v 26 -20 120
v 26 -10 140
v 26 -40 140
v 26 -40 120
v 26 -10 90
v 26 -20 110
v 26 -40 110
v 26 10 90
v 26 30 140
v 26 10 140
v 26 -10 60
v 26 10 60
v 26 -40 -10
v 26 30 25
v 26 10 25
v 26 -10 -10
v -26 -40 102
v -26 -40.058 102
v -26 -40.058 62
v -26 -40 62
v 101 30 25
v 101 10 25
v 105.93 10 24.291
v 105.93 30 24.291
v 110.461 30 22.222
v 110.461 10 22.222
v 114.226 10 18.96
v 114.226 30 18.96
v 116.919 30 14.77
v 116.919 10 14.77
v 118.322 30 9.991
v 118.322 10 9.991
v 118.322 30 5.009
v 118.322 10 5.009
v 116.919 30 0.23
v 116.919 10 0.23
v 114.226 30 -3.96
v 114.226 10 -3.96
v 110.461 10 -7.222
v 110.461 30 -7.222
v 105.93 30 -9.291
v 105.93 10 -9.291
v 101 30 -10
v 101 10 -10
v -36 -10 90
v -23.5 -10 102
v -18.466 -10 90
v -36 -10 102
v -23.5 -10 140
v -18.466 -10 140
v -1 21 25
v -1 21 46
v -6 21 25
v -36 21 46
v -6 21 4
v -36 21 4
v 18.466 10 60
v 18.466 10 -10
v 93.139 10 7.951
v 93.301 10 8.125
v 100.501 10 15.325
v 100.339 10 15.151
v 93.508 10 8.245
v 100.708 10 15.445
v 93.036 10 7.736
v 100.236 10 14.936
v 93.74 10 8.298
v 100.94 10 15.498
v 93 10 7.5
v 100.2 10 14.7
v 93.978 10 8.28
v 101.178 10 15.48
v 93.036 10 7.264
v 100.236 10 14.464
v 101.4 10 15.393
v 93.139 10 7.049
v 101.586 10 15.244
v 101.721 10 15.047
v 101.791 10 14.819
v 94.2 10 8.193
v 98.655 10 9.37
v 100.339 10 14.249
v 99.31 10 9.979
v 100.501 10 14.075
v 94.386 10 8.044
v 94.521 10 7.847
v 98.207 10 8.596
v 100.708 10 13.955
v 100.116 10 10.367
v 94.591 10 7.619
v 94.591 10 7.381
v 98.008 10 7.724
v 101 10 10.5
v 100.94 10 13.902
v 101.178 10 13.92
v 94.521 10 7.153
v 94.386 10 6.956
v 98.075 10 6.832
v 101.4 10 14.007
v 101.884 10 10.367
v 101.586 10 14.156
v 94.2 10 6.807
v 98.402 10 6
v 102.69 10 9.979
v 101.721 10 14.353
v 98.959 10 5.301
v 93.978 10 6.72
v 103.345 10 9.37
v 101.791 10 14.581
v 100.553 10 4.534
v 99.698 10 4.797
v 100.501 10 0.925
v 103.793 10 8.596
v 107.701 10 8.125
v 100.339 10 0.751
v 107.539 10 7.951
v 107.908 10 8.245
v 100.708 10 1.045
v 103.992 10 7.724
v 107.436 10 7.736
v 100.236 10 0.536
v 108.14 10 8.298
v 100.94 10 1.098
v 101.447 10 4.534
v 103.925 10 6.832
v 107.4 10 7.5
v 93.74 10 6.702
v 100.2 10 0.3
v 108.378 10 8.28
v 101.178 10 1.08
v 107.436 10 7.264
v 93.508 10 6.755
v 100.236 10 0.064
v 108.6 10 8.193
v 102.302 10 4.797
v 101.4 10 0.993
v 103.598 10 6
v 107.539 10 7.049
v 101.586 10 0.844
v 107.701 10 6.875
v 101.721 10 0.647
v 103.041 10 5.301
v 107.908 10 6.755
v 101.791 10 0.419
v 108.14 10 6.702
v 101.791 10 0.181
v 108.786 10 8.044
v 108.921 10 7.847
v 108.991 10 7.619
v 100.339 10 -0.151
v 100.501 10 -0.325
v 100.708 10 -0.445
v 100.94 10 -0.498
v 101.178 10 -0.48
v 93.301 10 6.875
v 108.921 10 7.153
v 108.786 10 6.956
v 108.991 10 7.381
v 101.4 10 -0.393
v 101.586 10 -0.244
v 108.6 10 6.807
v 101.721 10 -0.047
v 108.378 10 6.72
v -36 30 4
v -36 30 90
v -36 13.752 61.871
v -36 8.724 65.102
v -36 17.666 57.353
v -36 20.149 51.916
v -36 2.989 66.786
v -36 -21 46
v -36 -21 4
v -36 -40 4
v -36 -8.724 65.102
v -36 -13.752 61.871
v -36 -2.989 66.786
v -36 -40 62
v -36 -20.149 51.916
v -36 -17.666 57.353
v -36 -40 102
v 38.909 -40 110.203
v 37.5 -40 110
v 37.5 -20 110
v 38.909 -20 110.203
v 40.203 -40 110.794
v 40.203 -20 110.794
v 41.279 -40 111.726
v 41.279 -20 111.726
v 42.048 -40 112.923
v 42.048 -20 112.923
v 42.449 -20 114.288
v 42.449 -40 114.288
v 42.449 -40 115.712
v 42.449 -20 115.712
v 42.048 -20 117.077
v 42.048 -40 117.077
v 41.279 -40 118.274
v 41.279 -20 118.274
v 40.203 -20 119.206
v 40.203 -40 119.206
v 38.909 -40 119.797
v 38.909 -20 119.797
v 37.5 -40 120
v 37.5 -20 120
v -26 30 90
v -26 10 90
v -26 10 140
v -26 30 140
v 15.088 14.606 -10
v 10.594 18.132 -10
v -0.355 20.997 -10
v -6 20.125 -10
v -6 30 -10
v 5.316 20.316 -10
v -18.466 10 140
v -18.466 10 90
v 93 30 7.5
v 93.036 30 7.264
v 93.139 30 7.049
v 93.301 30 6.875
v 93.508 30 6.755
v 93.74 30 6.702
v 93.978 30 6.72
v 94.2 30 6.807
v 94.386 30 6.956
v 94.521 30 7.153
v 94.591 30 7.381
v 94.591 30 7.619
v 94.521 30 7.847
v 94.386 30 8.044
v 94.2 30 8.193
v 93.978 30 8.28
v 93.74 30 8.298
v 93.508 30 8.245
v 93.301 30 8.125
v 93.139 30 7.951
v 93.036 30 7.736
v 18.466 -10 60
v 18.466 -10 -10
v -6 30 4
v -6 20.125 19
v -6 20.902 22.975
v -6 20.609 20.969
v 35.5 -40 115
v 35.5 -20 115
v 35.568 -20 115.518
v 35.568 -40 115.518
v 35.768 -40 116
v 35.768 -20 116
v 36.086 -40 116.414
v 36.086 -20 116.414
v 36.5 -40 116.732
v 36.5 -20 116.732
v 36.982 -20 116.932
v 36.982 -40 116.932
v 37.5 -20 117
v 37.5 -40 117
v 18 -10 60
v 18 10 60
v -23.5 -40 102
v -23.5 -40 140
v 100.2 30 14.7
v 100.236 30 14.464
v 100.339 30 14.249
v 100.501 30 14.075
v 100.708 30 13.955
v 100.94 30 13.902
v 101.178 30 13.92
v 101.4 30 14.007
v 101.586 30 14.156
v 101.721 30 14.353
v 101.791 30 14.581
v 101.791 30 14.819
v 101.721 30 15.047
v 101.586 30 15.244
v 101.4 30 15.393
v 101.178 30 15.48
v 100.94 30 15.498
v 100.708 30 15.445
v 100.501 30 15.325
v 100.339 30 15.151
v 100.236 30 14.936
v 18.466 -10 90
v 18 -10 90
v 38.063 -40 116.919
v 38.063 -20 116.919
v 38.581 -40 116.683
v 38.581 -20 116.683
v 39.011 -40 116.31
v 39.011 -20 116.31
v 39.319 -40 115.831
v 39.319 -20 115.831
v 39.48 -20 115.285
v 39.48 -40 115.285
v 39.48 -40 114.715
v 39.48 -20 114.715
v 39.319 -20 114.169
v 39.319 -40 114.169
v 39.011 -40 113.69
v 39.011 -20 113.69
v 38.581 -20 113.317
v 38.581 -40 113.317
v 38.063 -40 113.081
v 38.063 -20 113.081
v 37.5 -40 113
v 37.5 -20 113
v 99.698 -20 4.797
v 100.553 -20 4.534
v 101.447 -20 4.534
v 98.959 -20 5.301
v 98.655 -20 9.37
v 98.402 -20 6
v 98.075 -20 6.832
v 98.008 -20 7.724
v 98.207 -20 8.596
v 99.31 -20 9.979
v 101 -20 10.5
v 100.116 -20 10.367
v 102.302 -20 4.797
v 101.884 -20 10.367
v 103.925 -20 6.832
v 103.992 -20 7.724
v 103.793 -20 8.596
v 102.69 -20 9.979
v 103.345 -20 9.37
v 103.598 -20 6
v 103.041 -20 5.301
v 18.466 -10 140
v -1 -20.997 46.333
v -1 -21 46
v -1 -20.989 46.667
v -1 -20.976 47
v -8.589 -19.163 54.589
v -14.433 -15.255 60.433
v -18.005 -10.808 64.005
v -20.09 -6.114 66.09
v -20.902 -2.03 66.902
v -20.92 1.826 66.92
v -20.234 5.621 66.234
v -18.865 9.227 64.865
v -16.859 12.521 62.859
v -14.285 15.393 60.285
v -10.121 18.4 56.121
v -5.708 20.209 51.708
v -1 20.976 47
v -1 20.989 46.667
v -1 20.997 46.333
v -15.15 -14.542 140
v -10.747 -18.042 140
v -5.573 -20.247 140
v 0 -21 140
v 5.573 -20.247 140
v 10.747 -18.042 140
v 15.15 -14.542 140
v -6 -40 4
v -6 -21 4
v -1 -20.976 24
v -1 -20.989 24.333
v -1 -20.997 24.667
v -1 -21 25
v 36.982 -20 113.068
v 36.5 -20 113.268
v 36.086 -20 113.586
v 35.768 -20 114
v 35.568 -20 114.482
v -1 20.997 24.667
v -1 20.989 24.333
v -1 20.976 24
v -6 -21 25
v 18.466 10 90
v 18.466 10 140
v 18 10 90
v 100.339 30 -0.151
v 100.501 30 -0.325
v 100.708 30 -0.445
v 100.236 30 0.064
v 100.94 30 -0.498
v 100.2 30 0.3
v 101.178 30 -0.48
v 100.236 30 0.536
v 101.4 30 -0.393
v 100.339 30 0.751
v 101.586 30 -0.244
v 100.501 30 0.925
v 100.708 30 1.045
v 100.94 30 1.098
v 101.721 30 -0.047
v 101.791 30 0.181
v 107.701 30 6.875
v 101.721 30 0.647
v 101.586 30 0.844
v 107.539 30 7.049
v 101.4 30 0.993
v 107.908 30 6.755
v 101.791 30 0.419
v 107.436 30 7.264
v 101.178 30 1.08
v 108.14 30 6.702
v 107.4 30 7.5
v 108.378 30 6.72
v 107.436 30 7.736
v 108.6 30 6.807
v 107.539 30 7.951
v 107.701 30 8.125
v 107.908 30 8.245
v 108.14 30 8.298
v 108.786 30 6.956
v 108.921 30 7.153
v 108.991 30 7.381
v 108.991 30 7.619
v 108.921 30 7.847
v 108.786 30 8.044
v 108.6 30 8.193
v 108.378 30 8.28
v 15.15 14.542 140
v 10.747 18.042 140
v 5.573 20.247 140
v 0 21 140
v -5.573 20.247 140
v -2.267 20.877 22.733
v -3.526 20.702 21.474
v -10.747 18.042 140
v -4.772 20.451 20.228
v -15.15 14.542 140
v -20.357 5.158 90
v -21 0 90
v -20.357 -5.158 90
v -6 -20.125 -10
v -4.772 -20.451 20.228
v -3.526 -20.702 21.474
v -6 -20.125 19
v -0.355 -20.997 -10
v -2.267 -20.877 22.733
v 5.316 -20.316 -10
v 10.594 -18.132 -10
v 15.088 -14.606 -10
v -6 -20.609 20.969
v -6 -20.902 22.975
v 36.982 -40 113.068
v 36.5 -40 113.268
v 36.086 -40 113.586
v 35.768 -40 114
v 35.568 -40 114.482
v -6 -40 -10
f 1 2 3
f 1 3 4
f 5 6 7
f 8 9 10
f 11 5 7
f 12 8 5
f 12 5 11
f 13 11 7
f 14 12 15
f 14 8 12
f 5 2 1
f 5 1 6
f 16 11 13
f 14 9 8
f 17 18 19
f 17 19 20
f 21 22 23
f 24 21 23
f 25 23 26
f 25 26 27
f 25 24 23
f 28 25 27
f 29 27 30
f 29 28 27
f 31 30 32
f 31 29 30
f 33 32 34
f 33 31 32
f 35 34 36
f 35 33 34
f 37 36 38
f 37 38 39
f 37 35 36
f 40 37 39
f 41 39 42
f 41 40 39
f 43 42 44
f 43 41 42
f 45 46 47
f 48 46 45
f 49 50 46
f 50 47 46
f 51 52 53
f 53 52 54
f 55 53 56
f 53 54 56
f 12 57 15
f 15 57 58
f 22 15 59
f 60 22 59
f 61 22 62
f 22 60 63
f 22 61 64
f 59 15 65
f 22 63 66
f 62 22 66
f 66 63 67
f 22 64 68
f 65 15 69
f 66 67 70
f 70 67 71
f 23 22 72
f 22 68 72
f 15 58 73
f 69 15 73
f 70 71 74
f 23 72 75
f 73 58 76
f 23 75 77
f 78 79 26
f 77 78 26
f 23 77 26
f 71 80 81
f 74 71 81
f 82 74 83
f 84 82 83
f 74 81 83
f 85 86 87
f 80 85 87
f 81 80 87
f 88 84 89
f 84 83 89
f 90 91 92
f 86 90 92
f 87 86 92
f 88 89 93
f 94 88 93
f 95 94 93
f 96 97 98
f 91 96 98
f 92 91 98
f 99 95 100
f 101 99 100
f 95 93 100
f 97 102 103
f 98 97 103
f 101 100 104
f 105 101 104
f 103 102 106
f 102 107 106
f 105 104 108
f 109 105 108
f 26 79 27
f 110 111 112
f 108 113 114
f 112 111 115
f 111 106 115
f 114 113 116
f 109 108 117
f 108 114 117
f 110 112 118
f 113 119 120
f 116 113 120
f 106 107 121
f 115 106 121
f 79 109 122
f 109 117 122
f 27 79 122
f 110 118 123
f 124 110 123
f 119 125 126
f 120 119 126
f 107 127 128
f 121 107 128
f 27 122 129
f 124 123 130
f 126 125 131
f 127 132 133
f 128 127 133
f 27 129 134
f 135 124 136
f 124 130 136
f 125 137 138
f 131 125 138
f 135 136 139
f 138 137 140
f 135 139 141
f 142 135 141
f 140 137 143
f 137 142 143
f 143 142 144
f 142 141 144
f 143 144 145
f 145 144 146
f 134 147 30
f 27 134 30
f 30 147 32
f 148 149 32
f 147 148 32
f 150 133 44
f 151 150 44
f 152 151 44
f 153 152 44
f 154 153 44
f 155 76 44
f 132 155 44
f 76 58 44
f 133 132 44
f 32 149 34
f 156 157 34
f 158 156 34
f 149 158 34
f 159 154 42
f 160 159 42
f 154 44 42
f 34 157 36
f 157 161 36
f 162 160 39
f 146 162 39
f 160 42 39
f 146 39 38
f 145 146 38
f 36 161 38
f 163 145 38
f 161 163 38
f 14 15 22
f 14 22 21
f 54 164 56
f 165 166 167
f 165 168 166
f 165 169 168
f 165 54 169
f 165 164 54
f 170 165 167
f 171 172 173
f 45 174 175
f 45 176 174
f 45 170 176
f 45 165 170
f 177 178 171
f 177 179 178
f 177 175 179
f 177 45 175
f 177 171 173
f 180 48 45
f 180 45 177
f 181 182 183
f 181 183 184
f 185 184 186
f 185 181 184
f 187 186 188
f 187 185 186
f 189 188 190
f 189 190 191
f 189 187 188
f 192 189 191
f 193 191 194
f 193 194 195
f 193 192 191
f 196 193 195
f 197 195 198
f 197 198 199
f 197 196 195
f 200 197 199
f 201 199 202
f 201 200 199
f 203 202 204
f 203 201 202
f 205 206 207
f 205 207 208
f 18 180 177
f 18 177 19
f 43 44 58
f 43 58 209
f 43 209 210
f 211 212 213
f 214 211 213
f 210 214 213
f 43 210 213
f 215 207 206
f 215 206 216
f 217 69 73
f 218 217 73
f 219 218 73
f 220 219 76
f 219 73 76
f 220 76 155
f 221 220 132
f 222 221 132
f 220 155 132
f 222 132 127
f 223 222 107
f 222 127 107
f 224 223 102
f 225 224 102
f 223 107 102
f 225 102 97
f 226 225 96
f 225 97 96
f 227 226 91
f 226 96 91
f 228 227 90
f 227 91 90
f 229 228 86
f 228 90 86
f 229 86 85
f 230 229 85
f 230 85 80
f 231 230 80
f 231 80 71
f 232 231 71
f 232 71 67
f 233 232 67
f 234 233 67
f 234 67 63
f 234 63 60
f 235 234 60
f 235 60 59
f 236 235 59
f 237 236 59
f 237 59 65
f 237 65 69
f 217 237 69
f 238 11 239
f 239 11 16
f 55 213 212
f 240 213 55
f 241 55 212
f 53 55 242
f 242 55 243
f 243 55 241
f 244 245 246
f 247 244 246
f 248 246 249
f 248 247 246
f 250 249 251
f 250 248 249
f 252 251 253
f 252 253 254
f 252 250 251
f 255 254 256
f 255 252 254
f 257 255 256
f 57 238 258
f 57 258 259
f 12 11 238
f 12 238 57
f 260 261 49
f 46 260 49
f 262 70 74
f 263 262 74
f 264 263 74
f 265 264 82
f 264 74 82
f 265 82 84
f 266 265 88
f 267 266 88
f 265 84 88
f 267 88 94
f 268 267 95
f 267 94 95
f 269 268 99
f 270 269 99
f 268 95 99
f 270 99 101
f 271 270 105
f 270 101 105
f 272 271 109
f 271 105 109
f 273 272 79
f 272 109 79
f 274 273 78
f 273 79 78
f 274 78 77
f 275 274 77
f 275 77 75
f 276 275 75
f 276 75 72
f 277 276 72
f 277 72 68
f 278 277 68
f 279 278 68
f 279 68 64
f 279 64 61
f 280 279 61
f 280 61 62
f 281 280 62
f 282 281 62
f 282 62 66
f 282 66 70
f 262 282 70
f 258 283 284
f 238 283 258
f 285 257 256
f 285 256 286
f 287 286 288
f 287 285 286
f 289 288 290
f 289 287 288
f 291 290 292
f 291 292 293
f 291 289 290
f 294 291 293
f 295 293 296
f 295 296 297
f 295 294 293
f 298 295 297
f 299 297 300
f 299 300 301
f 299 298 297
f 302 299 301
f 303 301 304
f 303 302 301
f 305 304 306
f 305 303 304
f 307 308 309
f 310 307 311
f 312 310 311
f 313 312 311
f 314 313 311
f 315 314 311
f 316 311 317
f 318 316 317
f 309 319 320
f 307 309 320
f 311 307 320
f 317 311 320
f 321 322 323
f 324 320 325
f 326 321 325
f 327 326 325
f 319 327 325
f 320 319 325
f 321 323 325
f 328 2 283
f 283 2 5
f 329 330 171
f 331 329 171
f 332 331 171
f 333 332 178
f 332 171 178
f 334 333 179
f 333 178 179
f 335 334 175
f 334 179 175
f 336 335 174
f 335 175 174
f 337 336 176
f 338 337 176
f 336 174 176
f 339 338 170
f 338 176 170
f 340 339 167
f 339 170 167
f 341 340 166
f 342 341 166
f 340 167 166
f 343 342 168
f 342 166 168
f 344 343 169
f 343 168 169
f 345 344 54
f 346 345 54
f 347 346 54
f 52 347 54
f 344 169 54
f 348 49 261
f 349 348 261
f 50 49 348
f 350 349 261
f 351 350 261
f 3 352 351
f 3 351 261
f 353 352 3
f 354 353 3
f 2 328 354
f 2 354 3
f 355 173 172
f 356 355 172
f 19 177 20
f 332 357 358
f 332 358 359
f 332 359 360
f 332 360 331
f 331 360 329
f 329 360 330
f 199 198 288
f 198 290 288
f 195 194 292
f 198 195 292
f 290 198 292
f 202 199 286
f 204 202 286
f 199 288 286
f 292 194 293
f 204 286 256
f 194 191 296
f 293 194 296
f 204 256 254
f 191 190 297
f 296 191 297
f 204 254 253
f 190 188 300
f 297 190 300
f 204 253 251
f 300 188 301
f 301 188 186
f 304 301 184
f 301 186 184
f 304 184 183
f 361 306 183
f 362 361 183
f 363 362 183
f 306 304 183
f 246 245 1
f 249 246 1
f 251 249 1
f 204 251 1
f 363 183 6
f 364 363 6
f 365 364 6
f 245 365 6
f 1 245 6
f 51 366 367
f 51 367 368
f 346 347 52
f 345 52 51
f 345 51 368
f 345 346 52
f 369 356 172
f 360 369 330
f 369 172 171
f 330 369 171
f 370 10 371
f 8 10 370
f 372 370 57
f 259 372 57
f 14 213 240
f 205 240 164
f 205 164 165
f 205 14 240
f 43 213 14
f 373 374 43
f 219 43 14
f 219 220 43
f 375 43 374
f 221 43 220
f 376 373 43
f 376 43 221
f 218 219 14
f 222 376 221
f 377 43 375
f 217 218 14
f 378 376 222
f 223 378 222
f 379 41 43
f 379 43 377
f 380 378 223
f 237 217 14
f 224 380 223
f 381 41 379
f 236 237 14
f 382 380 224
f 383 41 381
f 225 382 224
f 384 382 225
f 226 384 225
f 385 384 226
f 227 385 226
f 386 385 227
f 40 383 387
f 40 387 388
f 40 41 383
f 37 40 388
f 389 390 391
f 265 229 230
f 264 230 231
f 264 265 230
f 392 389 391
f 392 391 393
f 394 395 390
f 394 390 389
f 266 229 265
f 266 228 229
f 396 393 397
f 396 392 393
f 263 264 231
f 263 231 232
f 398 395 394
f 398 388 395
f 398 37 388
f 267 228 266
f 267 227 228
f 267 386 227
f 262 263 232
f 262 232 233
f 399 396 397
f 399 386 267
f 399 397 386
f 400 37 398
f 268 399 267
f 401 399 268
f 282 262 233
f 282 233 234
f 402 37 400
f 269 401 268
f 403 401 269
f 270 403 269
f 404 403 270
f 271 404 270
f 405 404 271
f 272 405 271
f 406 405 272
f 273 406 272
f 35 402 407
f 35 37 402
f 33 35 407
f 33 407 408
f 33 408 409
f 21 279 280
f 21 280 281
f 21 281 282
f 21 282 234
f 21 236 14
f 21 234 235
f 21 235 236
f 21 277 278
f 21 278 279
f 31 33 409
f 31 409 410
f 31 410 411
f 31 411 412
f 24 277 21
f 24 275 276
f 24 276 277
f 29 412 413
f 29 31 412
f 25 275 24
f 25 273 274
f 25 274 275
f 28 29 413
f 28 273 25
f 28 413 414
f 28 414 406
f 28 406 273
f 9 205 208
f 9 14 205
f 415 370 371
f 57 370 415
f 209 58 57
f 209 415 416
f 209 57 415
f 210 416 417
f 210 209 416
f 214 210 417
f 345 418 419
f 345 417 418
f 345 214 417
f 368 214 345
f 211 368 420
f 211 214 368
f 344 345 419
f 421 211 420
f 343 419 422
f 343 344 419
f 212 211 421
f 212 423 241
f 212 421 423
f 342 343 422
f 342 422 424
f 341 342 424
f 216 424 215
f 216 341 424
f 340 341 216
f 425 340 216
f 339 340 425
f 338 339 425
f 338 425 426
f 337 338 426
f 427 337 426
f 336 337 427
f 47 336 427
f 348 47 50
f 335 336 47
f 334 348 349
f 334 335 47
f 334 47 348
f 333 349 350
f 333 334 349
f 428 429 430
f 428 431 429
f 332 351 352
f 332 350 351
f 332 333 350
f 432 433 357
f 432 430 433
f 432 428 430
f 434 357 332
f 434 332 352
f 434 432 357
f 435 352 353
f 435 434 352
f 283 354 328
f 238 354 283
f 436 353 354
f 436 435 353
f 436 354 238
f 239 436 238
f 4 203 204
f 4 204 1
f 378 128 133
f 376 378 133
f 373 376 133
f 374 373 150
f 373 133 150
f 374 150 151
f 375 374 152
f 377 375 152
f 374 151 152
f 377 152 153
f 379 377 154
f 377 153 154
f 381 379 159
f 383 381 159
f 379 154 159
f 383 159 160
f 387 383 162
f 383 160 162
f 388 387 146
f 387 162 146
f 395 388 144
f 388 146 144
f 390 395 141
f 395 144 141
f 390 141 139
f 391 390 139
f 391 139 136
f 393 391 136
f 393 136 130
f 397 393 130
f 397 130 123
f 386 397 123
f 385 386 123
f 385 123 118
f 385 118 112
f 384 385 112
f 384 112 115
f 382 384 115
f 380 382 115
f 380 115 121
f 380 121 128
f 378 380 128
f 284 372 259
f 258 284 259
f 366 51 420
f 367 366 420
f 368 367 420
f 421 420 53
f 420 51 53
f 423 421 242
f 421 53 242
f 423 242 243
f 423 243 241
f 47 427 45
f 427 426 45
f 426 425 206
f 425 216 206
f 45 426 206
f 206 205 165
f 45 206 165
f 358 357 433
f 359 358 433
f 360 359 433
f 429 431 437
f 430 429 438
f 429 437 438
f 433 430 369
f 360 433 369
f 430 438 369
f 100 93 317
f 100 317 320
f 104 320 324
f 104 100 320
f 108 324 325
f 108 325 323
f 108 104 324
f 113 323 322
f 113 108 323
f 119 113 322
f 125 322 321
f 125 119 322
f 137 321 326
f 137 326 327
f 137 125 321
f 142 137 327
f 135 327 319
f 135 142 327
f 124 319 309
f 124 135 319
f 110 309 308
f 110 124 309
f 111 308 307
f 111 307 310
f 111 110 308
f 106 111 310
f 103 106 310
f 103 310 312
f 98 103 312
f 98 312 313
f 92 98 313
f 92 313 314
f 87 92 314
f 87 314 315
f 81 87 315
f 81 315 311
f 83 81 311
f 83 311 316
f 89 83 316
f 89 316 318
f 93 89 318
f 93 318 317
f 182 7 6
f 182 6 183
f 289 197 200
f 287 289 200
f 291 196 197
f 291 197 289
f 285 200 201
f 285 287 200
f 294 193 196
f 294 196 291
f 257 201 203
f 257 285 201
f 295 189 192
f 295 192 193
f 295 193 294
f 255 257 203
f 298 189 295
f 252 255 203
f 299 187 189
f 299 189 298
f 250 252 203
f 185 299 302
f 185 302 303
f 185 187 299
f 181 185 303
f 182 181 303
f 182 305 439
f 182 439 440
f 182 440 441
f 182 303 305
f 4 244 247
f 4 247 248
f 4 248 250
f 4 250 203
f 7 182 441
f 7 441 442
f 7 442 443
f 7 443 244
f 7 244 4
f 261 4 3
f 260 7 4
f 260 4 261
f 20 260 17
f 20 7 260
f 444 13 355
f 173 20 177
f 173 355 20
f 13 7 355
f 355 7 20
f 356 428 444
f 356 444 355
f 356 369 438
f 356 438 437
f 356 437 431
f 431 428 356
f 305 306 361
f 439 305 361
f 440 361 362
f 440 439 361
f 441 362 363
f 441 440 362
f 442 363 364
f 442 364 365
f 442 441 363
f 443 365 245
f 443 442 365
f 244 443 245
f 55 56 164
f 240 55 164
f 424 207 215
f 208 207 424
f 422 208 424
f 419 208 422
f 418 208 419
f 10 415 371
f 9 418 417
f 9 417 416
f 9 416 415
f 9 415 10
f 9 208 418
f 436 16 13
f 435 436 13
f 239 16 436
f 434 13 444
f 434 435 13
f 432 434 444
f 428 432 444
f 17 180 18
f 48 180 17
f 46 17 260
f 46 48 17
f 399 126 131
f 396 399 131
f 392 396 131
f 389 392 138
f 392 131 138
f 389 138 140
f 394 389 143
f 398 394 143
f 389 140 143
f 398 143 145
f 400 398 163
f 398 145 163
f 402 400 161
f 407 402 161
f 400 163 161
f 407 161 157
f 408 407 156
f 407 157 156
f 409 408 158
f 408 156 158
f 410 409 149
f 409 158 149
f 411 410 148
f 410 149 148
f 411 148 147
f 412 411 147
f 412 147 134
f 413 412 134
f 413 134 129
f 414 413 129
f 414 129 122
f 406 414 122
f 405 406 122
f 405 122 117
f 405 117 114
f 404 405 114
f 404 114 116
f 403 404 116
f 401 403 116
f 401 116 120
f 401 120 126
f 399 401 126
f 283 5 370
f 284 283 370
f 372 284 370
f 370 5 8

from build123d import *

# Parameters (mm, degrees)
EXTRUDE_1_DEPTH          = 140
EXTRUDE_1_DEPTH_BACK     = 10
SKETCH_2_W               = 52
SKETCH_2_H               = 70
SKETCH_3_W               = 94.267280548
SKETCH_3_H               = 20
CUT_EXTRUDE_1_DEPTH      = 50
SKETCH_4_W               = 2.5
SKETCH_4_H               = 30
CUT_EXTRUDE_2_DEPTH      = 38
EXTRUDE_2_DEPTH          = 20
CUT_EXTRUDE_7_DEPTH      = 152.678113121
CUT_EXTRUDE_7_DEPTH_BACK = 152.678113121
SKETCH_12_R              = 21
SKETCH_14_W              = 100
SKETCH_14_H              = 20
CUT_EXTRUDE_10_DEPTH     = 10
SKETCH_15_W              = 10
SKETCH_15_H              = 70
EXTRUDE_3_DEPTH          = 100
SKETCH_16_W              = 10
SKETCH_16_H              = 30
EXTRUDE_4_DEPTH          = 92
SKETCH_17_R              = 21
CUT_EXTRUDE_11_DEPTH     = 35
SKETCH_20_W              = 14
SKETCH_20_H              = 19
SKETCH_20_H_2            = 42
SKETCH_20_H_3            = 9
SKETCH_20_W_2            = 21
CUT_EXTRUDE_15_DEPTH     = 30
EXTRUDE_5_DEPTH          = 40
SKETCH_23_R              = 21
CUT_EXTRUDE_16_DEPTH     = 35
SKETCH_24_W              = 30
SKETCH_24_H              = 20
EXTRUDE_6_DEPTH          = 8
SKETCH_25_W              = 35
SKETCH_25_H              = 20
EXTRUDE_7_DEPTH          = 75
SKETCH_26_R              = 17.5
EXTRUDE_8_DEPTH          = 20
SKETCH_27_R              = 3
EXTRUDE_9_DEPTH          = 50
M2X0_4_1_D               = 1.6


with BuildPart() as part:
    # ｽｹｯﾁ2 → ﾎﾞｽ - 押し出し1 (new, two sides: drawn at the far end of the back side and taken through both)
    with BuildSketch(Plane.XY.offset(-EXTRUDE_1_DEPTH_BACK)):
        with Locations((0, -5)):
            Rectangle(SKETCH_2_W, SKETCH_2_H)
    extrude(amount=EXTRUDE_1_DEPTH + EXTRUDE_1_DEPTH_BACK)

    # ｽｹｯﾁ3 → ｶｯﾄ - 押し出し1 (cut)
    with BuildSketch(Plane.XY.offset(140)):
        Rectangle(SKETCH_3_W, SKETCH_3_H)
    extrude(amount=-CUT_EXTRUDE_1_DEPTH, mode=Mode.SUBTRACT)

    # ｽｹｯﾁ4 → ｶｯﾄ - 押し出し2 (cut)
    with BuildSketch(Plane.XY.offset(140)):
        with Locations((-24.75, -25)):
            Rectangle(SKETCH_4_W, SKETCH_4_H)
    extrude(amount=-CUT_EXTRUDE_2_DEPTH, mode=Mode.SUBTRACT)

    # ｽｹｯﾁ6 → ﾎﾞｽ - 押し出し2 (add)
    with BuildSketch(Plane(origin=(0, -40, 0), x_dir=(-1, 0, 0), z_dir=(0, -1, 0))):
        with BuildLine():
            Line((-37.5, -120), (-26, -120))
            Line((-26, -120), (-26, -110))
            Line((-26, -110), (-37.5, -110))
            ThreePointArc((-37.5, -110), (-33.964466094, -111.464466094), (-32.5, -115))
            ThreePointArc((-32.5, -115), (-33.964466094, -118.535533906), (-37.5, -120))
        make_face()
        with BuildLine():
            ThreePointArc((-37.5, -110), (-42.5, -115), (-37.5, -120))
            Line((-37.5, -120), (-37.5, -117))
            ThreePointArc((-37.5, -117), (-39.5, -115), (-37.5, -113))
            Line((-37.5, -113), (-37.5, -110))
        make_face()
        with BuildLine():
            Line((-37.5, -117), (-37.5, -120))
            ThreePointArc((-37.5, -120), (-33.964466094, -118.535533906), (-32.5, -115))
            ThreePointArc((-32.5, -115), (-33.964466094, -111.464466094), (-37.5, -110))
            Line((-37.5, -110), (-37.5, -113))
            ThreePointArc((-37.5, -113), (-36.085786438, -113.585786438), (-35.5, -115))
            ThreePointArc((-35.5, -115), (-36.085786438, -116.414213562), (-37.5, -117))
        make_face()
    extrude(amount=-EXTRUDE_2_DEPTH)

    # ｽｹｯﾁ12 → ｶｯﾄ - 押し出し7 (cut, two sides: drawn at the far end of the back side and taken through both)
    with BuildSketch(Plane.XY.offset(-CUT_EXTRUDE_7_DEPTH_BACK)):
        Circle(SKETCH_12_R)
    extrude(amount=CUT_EXTRUDE_7_DEPTH + CUT_EXTRUDE_7_DEPTH_BACK, mode=Mode.SUBTRACT)

    # ｽｹｯﾁ14 → ｶｯﾄ - 押し出し10 (cut)
    with BuildSketch(Plane(origin=(26, 0, 0), x_dir=(0, 0, -1), z_dir=(1, 0, 0))):
        with Locations((-40, 0)):
            Rectangle(SKETCH_14_W, SKETCH_14_H)
    extrude(amount=-CUT_EXTRUDE_10_DEPTH, mode=Mode.SUBTRACT)

    # ｽｹｯﾁ15 → ﾎﾞｽ - 押し出し3 (add)
    with BuildSketch(Plane(origin=(0, 0, -10), x_dir=(-1, 0, 0), z_dir=(0, 0, -1))):
        with Locations((31, -5)):
            Rectangle(SKETCH_15_W, SKETCH_15_H)
    extrude(amount=-EXTRUDE_3_DEPTH)

    # ｽｹｯﾁ16 → ﾎﾞｽ - 押し出し4 (add)
    with BuildSketch(Plane(origin=(0, 0, -10), x_dir=(-1, 0, 0), z_dir=(0, 0, -1))):
        with Locations((31, -25)):
            Rectangle(SKETCH_16_W, SKETCH_16_H)
    extrude(amount=-EXTRUDE_4_DEPTH)

    # ｽｹｯﾁ17 → ｶｯﾄ - 押し出し11 (cut)
    with BuildSketch(Plane.ZY.offset(36)):
        with Locations(Location((25, 0, 0), (0, 0, 270))):
            Circle(SKETCH_17_R)
    extrude(amount=-CUT_EXTRUDE_11_DEPTH, mode=Mode.SUBTRACT)

    # ｽｹｯﾁ20 → ｶｯﾄ - 押し出し15 (cut)
    with BuildSketch(Plane.ZY.offset(36)):
        with Locations((-3, -30.5)):
            Rectangle(SKETCH_20_W, SKETCH_20_H)
        with Locations((-3, 0)):
            Rectangle(SKETCH_20_W, SKETCH_20_H_2)
        with Locations((-3, 25.5)):
            Rectangle(SKETCH_20_W, SKETCH_20_H_3)
        with Locations((14.5, 0)):
            Rectangle(SKETCH_20_W_2, SKETCH_20_H_2)
    extrude(amount=-CUT_EXTRUDE_15_DEPTH, mode=Mode.SUBTRACT)

    # ｽｹｯﾁ22 → ﾎﾞｽ - 押し出し5 (add)
    with BuildSketch(Plane.XY.offset(102)):
        Polygon((-36, -40), (-26, -40.058181949), (-26, -10), (-36, -10), align=None)
    extrude(amount=-EXTRUDE_5_DEPTH)

    # ｽｹｯﾁ23 → ｶｯﾄ - 押し出し16 (cut)
    with BuildSketch(Plane.ZY.offset(36)):
        with Locations((46, 0)):
            Circle(SKETCH_23_R)
        with BuildLine():
            ThreePointArc((25, -6e-09), (31.150757593, 14.849242403), (46, 21))
            Line((46, 21), (25, 21))
            Line((25, 21), (25, -6e-09))
        make_face()
        with BuildLine():
            ThreePointArc((46, -21), (31.150757597, -14.849242407), (25, -6e-09))
            Line((25, -6e-09), (25, -21))
            Line((25, -21), (46, -21))
        make_face()
    extrude(amount=-CUT_EXTRUDE_16_DEPTH, mode=Mode.SUBTRACT)

    # ｽｹｯﾁ24 → ﾎﾞｽ - 押し出し6 (add)
    with BuildSketch(Plane(origin=(26, 0, 0), x_dir=(0, 0, -1), z_dir=(1, 0, 0))):
        with Locations((-75, 0)):
            Rectangle(SKETCH_24_W, SKETCH_24_H)
    extrude(amount=-EXTRUDE_6_DEPTH)

    # ｽｹｯﾁ25 → ﾎﾞｽ - 押し出し7 (add)
    with BuildSketch(Plane(origin=(26, 0, 0), x_dir=(0, 0, -1), z_dir=(1, 0, 0))):
        with Locations((-7.5, 20)):
            Rectangle(SKETCH_25_W, SKETCH_25_H)
    extrude(amount=EXTRUDE_7_DEPTH)

    # ｽｹｯﾁ26 → ﾎﾞｽ - 押し出し8 (add)
    with BuildSketch(Plane(origin=(0, 30, 0), x_dir=(1, 0, 0), z_dir=(0, 1, 0))):
        with Locations((101, -7.5)):
            Circle(SKETCH_26_R)
    extrude(amount=-EXTRUDE_8_DEPTH)

    # ｽｹｯﾁ27 → ﾎﾞｽ - 押し出し9 (add)
    with BuildSketch(Plane(origin=(0, 30, 0), x_dir=(1, 0, 0), z_dir=(0, 1, 0))):
        with Locations(Location((101, -7.5, 0), (0, 0, 270))):
            Circle(SKETCH_27_R)
    extrude(amount=-EXTRUDE_9_DEPTH)

    # M2x0.4 ねじ穴1 (through all)
    with Locations(Plane(origin=(0, 30, 0), x_dir=(1, 0, 0), z_dir=(0, 1, 0))):
        with Locations((101, -0.3), (101, -14.7), (108.2, -7.5), (93.8, -7.5)):
            Hole(M2X0_4_1_D / 2)


solid = part.part
